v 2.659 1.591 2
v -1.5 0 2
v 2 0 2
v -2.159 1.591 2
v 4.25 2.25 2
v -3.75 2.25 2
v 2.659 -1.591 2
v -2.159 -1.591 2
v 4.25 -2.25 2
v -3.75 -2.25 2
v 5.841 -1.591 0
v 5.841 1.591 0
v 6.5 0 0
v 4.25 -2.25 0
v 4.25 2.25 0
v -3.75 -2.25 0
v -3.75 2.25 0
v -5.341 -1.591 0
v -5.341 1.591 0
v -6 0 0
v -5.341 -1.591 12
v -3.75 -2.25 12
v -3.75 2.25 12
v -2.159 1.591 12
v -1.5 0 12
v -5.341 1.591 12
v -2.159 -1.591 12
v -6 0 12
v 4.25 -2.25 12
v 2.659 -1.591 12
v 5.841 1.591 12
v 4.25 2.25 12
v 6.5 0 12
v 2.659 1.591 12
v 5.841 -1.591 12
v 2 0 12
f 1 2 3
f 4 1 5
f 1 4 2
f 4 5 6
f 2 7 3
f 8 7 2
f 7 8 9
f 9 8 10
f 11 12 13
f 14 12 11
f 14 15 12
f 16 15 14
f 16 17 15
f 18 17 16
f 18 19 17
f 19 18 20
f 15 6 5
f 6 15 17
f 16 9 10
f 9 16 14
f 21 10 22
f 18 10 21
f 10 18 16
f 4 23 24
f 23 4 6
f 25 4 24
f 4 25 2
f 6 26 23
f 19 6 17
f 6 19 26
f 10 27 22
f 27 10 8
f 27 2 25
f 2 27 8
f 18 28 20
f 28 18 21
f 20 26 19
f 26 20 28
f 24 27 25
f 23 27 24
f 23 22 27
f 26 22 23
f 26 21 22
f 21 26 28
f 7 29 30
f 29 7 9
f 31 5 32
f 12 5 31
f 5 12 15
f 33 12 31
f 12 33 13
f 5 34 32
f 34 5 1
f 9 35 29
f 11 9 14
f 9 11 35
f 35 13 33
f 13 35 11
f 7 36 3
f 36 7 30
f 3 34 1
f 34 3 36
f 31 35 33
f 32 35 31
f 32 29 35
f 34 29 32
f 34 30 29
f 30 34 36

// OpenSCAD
module mini_bracket() {
    translate([-6, -4.5/2, 0]) {
        translate([4.5/2, 0, 0]) cube([8, 4.5, 2]);
        translate([4.5/2, 4.5/2, 0]) cylinder(12, 4.5/2, 4.5/2);
        translate([4.5/2+8, 4.5/2, 0]) cylinder(12, 4.5/2, 4.5/2);
    }
}

mini_bracket();
